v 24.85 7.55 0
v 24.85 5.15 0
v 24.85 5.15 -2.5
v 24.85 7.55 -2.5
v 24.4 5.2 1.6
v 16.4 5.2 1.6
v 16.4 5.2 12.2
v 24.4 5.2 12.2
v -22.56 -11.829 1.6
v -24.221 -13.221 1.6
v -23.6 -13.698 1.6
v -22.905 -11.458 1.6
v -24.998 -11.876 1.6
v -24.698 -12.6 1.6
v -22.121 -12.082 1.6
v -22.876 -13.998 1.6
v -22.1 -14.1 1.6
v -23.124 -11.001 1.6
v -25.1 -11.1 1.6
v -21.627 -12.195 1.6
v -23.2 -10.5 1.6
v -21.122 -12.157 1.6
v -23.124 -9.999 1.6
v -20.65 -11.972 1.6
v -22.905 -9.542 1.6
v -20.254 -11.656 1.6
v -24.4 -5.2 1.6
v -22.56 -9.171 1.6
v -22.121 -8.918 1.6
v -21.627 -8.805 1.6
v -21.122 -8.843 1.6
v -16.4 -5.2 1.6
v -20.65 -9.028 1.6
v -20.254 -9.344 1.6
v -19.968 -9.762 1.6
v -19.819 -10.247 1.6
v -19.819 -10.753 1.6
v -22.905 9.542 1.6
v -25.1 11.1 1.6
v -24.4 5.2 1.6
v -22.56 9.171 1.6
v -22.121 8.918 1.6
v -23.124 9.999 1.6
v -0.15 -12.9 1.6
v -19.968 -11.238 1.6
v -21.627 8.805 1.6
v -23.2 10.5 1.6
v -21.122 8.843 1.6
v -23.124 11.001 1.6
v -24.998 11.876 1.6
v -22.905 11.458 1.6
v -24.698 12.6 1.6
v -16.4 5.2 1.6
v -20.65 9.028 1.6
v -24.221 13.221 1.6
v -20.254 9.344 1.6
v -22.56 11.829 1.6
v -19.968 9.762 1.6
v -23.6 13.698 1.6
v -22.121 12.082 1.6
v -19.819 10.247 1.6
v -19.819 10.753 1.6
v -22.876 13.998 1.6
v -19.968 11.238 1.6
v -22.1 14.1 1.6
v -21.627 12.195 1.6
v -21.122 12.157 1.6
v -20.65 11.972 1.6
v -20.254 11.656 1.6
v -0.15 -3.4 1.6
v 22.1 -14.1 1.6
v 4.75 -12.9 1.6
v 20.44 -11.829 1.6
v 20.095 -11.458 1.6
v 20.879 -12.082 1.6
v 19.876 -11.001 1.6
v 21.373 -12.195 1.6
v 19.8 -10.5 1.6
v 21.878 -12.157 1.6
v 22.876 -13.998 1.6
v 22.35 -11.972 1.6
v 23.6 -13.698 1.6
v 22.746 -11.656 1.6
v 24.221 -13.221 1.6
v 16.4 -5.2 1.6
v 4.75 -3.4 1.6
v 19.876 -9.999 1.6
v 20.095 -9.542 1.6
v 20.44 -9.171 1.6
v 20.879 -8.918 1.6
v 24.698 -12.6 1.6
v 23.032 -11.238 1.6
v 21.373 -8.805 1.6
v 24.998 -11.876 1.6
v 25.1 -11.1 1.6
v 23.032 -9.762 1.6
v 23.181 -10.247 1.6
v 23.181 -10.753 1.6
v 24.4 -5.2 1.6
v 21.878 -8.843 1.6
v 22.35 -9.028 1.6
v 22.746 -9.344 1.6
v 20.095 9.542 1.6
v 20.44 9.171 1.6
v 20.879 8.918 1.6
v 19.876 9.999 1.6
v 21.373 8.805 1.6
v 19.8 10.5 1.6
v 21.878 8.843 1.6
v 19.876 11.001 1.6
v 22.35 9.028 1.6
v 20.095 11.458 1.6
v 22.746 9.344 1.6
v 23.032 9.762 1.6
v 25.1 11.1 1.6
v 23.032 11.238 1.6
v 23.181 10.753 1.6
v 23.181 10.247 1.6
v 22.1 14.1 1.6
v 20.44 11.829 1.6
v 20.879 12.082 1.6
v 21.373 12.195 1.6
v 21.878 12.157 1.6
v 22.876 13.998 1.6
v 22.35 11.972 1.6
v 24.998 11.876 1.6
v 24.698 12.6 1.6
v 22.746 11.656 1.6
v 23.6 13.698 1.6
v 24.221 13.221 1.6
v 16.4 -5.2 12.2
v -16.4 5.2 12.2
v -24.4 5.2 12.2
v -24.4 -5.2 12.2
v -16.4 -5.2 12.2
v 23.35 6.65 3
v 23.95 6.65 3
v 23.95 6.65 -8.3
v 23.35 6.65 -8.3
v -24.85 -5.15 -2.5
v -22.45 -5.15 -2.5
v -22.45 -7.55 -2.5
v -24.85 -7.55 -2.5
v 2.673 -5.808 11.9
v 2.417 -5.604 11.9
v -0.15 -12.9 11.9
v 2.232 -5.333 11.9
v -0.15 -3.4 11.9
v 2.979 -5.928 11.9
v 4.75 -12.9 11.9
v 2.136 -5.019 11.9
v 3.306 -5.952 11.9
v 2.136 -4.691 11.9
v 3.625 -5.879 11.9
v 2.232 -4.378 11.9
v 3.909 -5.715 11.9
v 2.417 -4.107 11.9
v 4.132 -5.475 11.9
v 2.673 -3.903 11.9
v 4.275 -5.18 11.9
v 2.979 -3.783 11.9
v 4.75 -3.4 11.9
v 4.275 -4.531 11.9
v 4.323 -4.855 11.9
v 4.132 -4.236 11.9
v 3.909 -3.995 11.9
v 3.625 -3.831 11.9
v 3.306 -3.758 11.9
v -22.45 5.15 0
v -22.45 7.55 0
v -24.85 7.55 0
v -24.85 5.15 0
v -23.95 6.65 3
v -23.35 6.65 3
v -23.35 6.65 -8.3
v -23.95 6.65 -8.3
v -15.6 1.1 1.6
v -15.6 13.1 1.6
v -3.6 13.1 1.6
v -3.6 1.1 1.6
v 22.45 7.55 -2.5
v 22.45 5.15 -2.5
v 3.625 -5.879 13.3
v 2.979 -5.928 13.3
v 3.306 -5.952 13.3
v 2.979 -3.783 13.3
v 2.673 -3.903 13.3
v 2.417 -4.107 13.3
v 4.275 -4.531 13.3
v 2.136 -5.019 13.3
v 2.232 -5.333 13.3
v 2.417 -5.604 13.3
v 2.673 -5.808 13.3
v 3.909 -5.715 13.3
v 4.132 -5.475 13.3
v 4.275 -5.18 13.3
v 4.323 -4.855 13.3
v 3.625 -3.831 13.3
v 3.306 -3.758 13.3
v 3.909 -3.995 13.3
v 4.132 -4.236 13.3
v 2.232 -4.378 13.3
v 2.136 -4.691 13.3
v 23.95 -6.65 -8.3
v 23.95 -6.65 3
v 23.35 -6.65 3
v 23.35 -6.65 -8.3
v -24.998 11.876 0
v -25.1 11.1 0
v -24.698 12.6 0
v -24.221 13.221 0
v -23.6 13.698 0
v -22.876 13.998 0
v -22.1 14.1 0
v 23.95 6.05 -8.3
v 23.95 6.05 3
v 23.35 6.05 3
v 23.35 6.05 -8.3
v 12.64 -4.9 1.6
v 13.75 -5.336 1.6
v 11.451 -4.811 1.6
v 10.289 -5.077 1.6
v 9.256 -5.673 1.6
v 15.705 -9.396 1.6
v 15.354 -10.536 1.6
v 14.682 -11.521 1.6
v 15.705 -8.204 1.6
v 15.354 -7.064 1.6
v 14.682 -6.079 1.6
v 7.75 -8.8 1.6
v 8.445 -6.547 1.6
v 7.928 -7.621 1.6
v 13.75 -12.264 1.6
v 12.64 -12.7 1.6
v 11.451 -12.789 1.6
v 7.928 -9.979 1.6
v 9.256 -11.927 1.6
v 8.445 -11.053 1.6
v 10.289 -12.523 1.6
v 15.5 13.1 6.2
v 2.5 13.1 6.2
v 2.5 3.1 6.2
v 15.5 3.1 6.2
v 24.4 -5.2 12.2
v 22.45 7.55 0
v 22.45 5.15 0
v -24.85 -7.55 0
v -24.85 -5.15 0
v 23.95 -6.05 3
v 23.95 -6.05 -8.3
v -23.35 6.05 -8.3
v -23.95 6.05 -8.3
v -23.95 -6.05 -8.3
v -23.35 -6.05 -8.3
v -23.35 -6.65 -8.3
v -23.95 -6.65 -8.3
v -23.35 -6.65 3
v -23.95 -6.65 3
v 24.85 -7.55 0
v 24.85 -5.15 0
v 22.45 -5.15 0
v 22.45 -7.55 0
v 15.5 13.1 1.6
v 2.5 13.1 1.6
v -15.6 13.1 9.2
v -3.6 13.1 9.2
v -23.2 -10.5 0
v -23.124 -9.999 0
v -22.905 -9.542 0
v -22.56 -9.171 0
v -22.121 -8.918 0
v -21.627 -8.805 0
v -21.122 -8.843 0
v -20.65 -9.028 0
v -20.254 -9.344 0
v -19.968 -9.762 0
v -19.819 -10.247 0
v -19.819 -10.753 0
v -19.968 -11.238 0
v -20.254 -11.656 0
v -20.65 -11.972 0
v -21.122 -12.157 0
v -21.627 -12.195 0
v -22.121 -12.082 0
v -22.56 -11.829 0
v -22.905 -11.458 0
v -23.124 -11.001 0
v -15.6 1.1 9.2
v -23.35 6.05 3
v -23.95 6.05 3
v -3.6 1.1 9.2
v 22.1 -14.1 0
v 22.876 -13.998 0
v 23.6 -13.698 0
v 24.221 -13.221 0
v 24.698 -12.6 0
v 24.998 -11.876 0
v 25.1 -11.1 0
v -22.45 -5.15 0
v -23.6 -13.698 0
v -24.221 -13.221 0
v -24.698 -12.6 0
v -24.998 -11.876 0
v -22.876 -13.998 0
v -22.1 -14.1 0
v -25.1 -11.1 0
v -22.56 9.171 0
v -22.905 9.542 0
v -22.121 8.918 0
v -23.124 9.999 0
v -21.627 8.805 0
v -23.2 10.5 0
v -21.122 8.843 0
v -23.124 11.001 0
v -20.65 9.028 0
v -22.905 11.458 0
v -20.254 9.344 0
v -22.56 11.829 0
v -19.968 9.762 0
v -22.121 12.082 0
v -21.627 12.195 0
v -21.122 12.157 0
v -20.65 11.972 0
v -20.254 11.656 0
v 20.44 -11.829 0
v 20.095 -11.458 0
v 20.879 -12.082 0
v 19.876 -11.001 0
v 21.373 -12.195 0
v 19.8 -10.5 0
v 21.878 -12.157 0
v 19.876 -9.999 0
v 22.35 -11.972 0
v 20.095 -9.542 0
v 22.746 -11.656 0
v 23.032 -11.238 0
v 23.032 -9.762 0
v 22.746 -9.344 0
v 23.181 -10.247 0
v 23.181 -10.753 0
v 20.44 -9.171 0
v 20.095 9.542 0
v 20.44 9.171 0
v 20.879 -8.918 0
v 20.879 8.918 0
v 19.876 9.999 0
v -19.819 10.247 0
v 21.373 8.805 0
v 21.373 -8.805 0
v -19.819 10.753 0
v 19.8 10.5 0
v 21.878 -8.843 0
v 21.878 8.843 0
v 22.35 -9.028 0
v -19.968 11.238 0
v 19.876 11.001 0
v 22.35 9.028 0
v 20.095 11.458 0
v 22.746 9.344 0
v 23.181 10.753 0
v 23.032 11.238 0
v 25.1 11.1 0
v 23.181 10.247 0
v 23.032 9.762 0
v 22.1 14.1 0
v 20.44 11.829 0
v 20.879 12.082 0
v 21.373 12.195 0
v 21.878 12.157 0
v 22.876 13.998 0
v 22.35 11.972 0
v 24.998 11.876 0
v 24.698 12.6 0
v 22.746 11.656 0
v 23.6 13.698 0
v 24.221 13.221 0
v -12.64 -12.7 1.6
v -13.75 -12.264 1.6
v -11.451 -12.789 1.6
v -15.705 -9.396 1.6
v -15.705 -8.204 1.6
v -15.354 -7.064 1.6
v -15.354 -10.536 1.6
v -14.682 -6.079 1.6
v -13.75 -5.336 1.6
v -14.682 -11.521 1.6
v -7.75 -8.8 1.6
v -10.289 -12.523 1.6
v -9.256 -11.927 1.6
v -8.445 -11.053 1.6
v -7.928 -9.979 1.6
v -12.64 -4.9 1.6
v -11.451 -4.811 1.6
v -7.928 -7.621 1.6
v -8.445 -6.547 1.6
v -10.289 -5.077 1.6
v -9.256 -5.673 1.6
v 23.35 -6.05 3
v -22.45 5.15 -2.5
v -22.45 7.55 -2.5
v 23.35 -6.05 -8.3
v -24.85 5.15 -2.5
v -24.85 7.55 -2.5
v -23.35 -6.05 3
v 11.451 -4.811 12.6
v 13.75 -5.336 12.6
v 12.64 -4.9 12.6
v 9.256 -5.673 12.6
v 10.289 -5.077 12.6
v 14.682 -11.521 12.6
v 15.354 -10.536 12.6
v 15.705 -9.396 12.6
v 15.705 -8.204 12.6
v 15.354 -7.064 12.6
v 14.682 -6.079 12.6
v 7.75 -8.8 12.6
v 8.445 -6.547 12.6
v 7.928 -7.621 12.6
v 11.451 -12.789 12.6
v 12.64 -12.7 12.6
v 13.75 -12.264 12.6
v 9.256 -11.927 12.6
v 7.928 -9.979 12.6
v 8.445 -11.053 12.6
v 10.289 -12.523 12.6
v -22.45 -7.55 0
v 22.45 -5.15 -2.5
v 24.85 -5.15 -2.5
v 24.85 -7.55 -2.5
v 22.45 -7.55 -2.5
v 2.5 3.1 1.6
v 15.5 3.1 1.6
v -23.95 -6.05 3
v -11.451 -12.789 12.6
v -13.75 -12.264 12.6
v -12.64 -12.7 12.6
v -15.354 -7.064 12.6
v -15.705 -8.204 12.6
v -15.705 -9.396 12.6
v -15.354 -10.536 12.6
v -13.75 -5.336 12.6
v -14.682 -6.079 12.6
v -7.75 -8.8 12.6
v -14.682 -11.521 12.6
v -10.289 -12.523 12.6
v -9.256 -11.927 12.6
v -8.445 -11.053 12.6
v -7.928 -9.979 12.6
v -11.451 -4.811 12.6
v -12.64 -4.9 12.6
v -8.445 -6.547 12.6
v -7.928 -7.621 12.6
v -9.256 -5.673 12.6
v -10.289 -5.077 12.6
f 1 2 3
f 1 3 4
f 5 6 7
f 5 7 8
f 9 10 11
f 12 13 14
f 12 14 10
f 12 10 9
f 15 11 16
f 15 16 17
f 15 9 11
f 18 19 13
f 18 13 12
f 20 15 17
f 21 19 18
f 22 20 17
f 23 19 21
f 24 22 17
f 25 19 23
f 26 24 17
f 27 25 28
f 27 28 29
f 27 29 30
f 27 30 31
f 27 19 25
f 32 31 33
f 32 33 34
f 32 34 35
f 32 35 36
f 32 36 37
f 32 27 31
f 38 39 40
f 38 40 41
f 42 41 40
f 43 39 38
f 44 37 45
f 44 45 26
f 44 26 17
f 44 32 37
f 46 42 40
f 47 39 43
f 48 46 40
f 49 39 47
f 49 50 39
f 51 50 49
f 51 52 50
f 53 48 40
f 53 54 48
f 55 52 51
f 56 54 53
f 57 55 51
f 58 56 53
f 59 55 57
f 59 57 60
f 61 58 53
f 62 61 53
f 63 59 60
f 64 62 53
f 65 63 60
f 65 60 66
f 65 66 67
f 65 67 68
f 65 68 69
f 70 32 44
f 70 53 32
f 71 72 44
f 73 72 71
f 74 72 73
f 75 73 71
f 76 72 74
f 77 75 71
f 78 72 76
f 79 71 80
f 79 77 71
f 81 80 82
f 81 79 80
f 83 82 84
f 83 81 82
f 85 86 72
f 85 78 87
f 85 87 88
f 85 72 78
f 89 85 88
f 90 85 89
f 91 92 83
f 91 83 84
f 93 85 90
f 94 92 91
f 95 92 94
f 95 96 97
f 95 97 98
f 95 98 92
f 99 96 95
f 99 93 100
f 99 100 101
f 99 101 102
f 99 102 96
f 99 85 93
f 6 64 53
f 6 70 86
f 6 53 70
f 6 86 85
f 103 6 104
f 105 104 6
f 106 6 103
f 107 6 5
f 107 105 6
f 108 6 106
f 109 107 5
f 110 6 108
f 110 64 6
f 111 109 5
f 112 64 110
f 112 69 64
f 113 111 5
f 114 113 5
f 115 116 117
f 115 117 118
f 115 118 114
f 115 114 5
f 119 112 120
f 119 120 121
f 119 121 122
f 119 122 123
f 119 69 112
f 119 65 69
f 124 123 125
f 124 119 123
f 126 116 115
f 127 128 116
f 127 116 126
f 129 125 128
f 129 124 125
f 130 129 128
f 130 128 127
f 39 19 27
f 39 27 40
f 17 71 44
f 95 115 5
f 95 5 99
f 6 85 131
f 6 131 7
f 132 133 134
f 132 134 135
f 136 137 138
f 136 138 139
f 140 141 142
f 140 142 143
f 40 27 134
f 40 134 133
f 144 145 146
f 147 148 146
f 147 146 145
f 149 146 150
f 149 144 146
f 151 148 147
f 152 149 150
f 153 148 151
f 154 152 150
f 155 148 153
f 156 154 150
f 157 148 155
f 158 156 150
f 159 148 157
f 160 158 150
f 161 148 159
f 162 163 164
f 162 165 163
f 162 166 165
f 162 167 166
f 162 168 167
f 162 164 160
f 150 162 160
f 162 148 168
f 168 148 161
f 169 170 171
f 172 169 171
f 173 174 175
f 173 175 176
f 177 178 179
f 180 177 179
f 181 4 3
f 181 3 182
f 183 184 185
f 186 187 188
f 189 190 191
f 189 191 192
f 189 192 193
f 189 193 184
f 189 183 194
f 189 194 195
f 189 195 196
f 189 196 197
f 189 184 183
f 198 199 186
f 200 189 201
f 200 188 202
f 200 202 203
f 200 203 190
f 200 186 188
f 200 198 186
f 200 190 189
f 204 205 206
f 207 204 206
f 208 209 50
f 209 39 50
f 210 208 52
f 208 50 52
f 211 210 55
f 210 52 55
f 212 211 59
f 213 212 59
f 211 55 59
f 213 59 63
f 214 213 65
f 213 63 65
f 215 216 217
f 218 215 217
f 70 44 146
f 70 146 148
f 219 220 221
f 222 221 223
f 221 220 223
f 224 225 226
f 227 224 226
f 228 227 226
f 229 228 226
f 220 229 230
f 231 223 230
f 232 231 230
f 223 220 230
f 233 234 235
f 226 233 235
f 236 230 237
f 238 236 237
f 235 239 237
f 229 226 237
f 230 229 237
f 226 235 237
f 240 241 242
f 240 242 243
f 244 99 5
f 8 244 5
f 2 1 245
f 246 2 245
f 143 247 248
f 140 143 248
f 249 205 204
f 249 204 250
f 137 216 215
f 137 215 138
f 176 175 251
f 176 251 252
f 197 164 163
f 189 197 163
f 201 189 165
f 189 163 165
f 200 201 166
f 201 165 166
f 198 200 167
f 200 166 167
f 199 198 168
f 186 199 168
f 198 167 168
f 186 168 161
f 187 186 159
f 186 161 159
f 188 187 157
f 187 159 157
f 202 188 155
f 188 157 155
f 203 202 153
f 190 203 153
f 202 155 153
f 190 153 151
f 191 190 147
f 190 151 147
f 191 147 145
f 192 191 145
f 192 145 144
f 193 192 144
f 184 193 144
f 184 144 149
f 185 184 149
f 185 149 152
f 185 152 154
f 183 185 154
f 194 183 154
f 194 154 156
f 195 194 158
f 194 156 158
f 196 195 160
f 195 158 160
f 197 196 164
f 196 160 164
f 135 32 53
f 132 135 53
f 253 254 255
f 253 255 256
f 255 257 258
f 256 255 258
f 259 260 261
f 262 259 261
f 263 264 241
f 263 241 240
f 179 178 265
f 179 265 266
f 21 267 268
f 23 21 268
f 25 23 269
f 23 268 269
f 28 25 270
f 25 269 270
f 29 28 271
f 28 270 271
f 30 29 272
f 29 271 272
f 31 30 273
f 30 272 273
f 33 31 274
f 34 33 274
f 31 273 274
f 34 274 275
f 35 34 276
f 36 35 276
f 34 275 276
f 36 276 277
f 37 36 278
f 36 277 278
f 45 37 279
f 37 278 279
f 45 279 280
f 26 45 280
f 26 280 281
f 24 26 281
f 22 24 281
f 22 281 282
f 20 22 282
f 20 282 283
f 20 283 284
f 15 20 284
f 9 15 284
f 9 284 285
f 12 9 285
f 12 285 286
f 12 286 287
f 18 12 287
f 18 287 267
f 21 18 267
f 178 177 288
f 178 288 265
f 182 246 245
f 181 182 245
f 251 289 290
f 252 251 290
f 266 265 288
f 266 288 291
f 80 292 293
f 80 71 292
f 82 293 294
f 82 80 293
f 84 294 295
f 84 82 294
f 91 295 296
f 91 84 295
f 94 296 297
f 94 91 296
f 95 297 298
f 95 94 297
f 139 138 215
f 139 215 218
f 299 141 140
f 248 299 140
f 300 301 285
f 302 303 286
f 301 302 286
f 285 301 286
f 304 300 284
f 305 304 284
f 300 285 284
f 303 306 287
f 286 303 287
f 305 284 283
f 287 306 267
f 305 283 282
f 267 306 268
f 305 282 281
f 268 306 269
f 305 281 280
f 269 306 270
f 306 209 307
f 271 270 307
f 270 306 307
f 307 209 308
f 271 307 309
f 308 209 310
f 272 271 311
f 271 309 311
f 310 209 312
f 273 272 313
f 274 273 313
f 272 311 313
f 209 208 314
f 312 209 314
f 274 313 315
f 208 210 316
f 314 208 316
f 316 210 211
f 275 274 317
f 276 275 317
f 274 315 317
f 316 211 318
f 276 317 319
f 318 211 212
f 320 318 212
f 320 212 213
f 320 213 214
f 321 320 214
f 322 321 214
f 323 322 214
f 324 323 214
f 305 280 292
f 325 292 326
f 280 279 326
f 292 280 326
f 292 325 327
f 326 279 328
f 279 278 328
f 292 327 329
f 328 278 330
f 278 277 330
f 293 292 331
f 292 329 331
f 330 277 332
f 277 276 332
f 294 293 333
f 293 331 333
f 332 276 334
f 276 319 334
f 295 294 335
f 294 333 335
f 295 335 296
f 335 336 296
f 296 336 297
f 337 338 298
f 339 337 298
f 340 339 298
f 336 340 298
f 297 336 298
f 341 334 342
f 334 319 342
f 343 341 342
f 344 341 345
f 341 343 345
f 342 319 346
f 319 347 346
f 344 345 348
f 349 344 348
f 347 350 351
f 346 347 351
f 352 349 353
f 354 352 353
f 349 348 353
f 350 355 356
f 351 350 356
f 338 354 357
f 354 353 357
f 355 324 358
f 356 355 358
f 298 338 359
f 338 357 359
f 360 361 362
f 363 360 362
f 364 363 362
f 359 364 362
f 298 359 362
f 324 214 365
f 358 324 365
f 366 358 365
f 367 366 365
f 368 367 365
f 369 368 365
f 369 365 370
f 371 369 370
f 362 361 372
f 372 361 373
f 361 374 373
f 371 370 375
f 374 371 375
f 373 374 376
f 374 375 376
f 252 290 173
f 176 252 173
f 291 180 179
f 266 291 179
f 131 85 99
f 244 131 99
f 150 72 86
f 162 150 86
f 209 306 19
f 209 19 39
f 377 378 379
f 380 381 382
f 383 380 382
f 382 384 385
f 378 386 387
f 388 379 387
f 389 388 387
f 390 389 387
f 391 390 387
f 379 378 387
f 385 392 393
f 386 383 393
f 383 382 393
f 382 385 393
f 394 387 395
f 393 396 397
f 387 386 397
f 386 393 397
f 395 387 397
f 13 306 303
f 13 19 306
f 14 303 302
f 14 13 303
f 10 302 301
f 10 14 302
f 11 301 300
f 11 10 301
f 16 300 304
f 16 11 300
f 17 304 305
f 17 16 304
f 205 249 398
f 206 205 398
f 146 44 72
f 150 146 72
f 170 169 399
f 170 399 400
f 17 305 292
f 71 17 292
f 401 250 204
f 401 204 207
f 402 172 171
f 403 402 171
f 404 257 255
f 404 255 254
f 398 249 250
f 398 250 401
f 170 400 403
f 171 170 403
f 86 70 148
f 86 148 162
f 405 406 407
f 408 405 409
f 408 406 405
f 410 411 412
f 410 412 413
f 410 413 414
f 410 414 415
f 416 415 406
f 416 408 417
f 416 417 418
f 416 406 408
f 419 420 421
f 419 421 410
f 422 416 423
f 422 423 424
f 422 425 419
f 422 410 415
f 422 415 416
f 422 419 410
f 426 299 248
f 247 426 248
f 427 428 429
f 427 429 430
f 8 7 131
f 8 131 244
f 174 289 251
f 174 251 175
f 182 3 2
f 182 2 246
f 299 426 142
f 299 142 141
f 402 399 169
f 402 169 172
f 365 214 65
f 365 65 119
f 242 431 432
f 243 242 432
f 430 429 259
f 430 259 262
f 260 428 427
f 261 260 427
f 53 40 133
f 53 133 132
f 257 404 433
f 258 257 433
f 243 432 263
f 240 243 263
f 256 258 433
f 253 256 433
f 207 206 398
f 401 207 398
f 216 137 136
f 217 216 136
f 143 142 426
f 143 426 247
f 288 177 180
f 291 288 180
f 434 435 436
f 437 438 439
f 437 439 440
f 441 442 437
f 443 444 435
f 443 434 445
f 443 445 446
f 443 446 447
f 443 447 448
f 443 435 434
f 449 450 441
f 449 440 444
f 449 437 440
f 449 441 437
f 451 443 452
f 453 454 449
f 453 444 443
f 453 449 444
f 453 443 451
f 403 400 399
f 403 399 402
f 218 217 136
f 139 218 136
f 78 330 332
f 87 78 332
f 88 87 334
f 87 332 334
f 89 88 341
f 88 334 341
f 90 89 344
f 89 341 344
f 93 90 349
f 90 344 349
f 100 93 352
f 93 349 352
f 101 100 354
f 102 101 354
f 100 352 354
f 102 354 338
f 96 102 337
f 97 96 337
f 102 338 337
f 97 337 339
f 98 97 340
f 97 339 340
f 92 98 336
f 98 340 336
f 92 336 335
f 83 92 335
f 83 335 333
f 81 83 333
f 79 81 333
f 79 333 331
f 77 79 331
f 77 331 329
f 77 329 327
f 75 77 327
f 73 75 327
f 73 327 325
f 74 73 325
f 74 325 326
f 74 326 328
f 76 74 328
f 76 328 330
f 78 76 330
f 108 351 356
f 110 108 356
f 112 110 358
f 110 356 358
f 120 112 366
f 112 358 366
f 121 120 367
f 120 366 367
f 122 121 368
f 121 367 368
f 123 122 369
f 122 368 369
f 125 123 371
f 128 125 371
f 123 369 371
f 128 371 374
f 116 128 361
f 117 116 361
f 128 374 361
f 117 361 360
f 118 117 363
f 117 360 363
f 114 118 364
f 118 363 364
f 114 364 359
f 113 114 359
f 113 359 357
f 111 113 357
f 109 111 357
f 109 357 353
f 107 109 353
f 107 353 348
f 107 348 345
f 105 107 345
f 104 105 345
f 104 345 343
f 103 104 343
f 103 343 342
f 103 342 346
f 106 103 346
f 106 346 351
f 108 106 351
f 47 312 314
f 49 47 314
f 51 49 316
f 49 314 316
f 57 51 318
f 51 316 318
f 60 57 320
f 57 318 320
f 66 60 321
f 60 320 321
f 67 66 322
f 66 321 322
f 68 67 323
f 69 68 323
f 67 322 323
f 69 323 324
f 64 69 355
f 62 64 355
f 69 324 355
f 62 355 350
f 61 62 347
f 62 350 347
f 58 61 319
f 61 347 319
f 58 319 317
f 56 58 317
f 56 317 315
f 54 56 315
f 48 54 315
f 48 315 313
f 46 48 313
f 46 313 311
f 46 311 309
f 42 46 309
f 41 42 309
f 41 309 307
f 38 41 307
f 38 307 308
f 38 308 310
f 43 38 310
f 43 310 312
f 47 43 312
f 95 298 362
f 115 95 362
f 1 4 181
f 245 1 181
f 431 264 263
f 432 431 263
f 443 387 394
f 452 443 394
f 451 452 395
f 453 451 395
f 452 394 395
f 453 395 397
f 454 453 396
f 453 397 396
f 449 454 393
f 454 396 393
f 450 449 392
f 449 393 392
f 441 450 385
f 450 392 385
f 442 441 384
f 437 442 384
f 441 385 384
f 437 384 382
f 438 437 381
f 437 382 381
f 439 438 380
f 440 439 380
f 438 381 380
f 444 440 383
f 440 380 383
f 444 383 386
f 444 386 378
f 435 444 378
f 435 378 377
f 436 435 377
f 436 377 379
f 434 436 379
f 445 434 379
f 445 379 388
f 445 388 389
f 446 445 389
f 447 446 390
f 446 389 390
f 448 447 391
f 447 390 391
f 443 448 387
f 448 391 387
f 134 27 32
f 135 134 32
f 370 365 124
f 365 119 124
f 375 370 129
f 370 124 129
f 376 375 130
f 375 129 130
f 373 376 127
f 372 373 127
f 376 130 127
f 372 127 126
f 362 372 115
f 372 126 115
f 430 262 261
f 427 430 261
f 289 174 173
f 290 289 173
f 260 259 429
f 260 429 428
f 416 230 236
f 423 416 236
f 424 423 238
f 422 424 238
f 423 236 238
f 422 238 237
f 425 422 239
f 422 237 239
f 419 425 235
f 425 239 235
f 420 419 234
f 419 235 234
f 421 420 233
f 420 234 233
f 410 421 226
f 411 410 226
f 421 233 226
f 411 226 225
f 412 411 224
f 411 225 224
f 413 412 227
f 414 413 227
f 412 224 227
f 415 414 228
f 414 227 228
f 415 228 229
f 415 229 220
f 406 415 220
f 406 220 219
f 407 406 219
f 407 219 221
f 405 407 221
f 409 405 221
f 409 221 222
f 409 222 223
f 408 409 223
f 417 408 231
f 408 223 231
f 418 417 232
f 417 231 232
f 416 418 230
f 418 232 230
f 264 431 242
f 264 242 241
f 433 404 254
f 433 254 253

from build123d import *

# Parameters (mm, degrees)
ESQUISSE1_W               = 50.2
ESQUISSE1_H               = 28.2
BOSS_EXTRU_1_DEPTH        = 1.6
D_GAGEMENT_M31_D          = 3.4
CONG_1_R                  = 3
ESQUISSE5_W               = 8
ESQUISSE5_H               = 10.4
BOSS_EXTRU_2_DEPTH        = 10.6
ESQUISSE6_R               = 4
BOSS_EXTRU_3_DEPTH        = 11
BOSS_EXTRU_3_2_DEPTH      = 11
ESQUISSE7_W               = 4.9
ESQUISSE7_H               = 9.5
BOSS_EXTRU_4_DEPTH        = 10.3
ESQUISSE8_R               = 1.1
BOSS_EXTRU_5_DEPTH        = 1.4
ESQUISSE9_W               = 12
ESQUISSE9_H               = 12
BOSS_EXTRU_6_DEPTH        = 7.6
ESQUISSE10_W              = 13
ESQUISSE10_H              = 10
BOSS_EXTRU_7_DEPTH        = 4.6
BOSS_EXTRU_8_DEPTH        = 8.3
BOSS_EXTRU_8_DEPTH_BACK   = 3
ESQUISSE11_W              = 0.6
ESQUISSE11_H              = 0.6
BOSS_EXTRU_8_2_DEPTH      = 8.3
BOSS_EXTRU_8_2_DEPTH_BACK = 3
BOSS_EXTRU_8_3_DEPTH      = 8.3
BOSS_EXTRU_8_3_DEPTH_BACK = 3
BOSS_EXTRU_8_4_DEPTH      = 8.3
BOSS_EXTRU_8_4_DEPTH_BACK = 3
ESQUISSE12_W              = 2.4
ESQUISSE12_H              = 2.4
BOSS_EXTRU_9_DEPTH        = 2.5
BOSS_EXTRU_9_2_DEPTH      = 2.5
BOSS_EXTRU_9_3_DEPTH      = 2.5
BOSS_EXTRU_9_4_DEPTH      = 2.5


with BuildPart() as part:
    # Esquisse1 → Boss.-Extru.1 (new body)
    with BuildSketch(Plane.XY):
        Rectangle(ESQUISSE1_W, ESQUISSE1_H)
    extrude(amount=BOSS_EXTRU_1_DEPTH)

    # Dégagement M31 (through all)
    with Locations(Plane.XY.offset(1.6)):
        with Locations((-21.5, 10.5), (21.5, 10.5), (21.5, -10.5), (-21.5, -10.5)):
            Hole(D_GAGEMENT_M31_D / 2)

    # Congé1
    cong_1_edges = [part.edges().sort_by_distance(p)[0] for p in [
        (-25.1, 14.1, 0.8),
        (25.1, 14.1, 0.8),
        (25.1, -14.1, 0.8),
        (-25.1, -14.1, 0.8),
    ]]
    fillet(cong_1_edges, radius=CONG_1_R)

    # Esquisse5 → Boss.-Extru.2 (add)
    with BuildSketch(Plane.XY.offset(1.6)):
        with Locations((-20.4, 0)):
            Rectangle(ESQUISSE5_W, ESQUISSE5_H)
        with Locations((20.4, 0)):
            Rectangle(ESQUISSE5_W, ESQUISSE5_H)
    extrude(amount=BOSS_EXTRU_2_DEPTH)



with BuildPart() as body_2:
    # Esquisse6 → Boss.-Extru.3 (new body)
    with BuildSketch(Plane.XY.offset(1.6)):
        with Locations((-11.75, -8.8)):
            Circle(ESQUISSE6_R)
    extrude(amount=BOSS_EXTRU_3_DEPTH)


with BuildPart() as body_3:
    # Esquisse6 → Boss.-Extru.3 2 (new body)
    with BuildSketch(Plane.XY.offset(1.6)):
        with Locations(Location((11.75, -8.8, 0), (0, 0, 180))):
            Circle(ESQUISSE6_R)
    extrude(amount=BOSS_EXTRU_3_2_DEPTH)


with BuildPart() as body_4:
    # Esquisse7 → Boss.-Extru.4 (new body)
    with BuildSketch(Plane.XY.offset(1.6)):
        with Locations((2.3, -8.15)):
            Rectangle(ESQUISSE7_W, ESQUISSE7_H)
    extrude(amount=BOSS_EXTRU_4_DEPTH)


with BuildPart() as part_1:
    add(part.part)

    add(body_4.part)  # Boss.-Extru.5 merges body 4
    # Esquisse8 → Boss.-Extru.5 (add)
    with BuildSketch(Plane.XY.offset(11.9)):
        with Locations((3.223425578, -4.855392367)):
            Circle(ESQUISSE8_R)
    extrude(amount=BOSS_EXTRU_5_DEPTH)


with BuildPart() as body_4_2:
    # Esquisse9 → Boss.-Extru.6 (new body)
    with BuildSketch(Plane.XY.offset(1.6)):
        with Locations((-9.6, 7.1)):
            Rectangle(ESQUISSE9_W, ESQUISSE9_H)
    extrude(amount=BOSS_EXTRU_6_DEPTH)


with BuildPart() as body_5:
    # Esquisse10 → Boss.-Extru.7 (new body)
    with BuildSketch(Plane.XY.offset(1.6)):
        with Locations((9, 8.1)):
            Rectangle(ESQUISSE10_W, ESQUISSE10_H)
    extrude(amount=BOSS_EXTRU_7_DEPTH)


with BuildPart() as body_6:
    # Esquisse11 → Boss.-Extru.8 (new, two sides: drawn at the far end of the back side and taken through both)
    with BuildSketch(Plane(origin=(0, 0, 0), x_dir=(-1, 0, 0), z_dir=(0, 0, -1)).offset(-BOSS_EXTRU_8_DEPTH_BACK)):
        with Locations((-23.65, 6.35)):
            Rectangle(ESQUISSE11_W, ESQUISSE11_H)
    extrude(amount=BOSS_EXTRU_8_DEPTH + BOSS_EXTRU_8_DEPTH_BACK)


with BuildPart() as body_7:
    # Esquisse11 → Boss.-Extru.8 2 (new, two sides: drawn at the far end of the back side and taken through both)
    with BuildSketch(Plane(origin=(0, 0, 0), x_dir=(-1, 0, 0), z_dir=(0, 0, -1)).offset(-BOSS_EXTRU_8_2_DEPTH_BACK)):
        with Locations((23.65, 6.35)):
            Rectangle(ESQUISSE11_W, ESQUISSE11_H)
    extrude(amount=BOSS_EXTRU_8_2_DEPTH + BOSS_EXTRU_8_2_DEPTH_BACK)


with BuildPart() as body_8:
    # Esquisse11 → Boss.-Extru.8 3 (new, two sides: drawn at the far end of the back side and taken through both)
    with BuildSketch(Plane(origin=(0, 0, 0), x_dir=(-1, 0, 0), z_dir=(0, 0, -1)).offset(-BOSS_EXTRU_8_3_DEPTH_BACK)):
        with Locations((-23.65, -6.35)):
            Rectangle(ESQUISSE11_W, ESQUISSE11_H)
    extrude(amount=BOSS_EXTRU_8_3_DEPTH + BOSS_EXTRU_8_3_DEPTH_BACK)


with BuildPart() as body_9:
    # Esquisse11 → Boss.-Extru.8 4 (new, two sides: drawn at the far end of the back side and taken through both)
    with BuildSketch(Plane(origin=(0, 0, 0), x_dir=(-1, 0, 0), z_dir=(0, 0, -1)).offset(-BOSS_EXTRU_8_4_DEPTH_BACK)):
        with Locations((23.65, -6.35)):
            Rectangle(ESQUISSE11_W, ESQUISSE11_H)
    extrude(amount=BOSS_EXTRU_8_4_DEPTH + BOSS_EXTRU_8_4_DEPTH_BACK)


with BuildPart() as body_10:
    # Esquisse12 → Boss.-Extru.9 (new body)
    with BuildSketch(Plane(origin=(0, 0, 0), x_dir=(-1, 0, 0), z_dir=(0, 0, -1))):
        with Locations((-23.65, 6.35)):
            Rectangle(ESQUISSE12_W, ESQUISSE12_H)
    extrude(amount=BOSS_EXTRU_9_DEPTH)


with BuildPart() as body_11:
    # Esquisse12 → Boss.-Extru.9 2 (new body)
    with BuildSketch(Plane(origin=(0, 0, 0), x_dir=(-1, 0, 0), z_dir=(0, 0, -1))):
        with Locations((23.65, 6.35)):
            Rectangle(ESQUISSE12_W, ESQUISSE12_H)
    extrude(amount=BOSS_EXTRU_9_2_DEPTH)


with BuildPart() as body_12:
    # Esquisse12 → Boss.-Extru.9 3 (new body)
    with BuildSketch(Plane(origin=(0, 0, 0), x_dir=(-1, 0, 0), z_dir=(0, 0, -1))):
        with Locations((23.65, -6.35)):
            Rectangle(ESQUISSE12_W, ESQUISSE12_H)
    extrude(amount=BOSS_EXTRU_9_3_DEPTH)


with BuildPart() as body_13:
    # Esquisse12 → Boss.-Extru.9 4 (new body)
    with BuildSketch(Plane(origin=(0, 0, 0), x_dir=(-1, 0, 0), z_dir=(0, 0, -1))):
        with Locations((-23.65, -6.35)):
            Rectangle(ESQUISSE12_W, ESQUISSE12_H)
    extrude(amount=BOSS_EXTRU_9_4_DEPTH)


solid = Compound([body_2.part, body_3.part, part_1.part, body_4_2.part, body_5.part, body_6.part, body_7.part, body_8.part, body_9.part, body_10.part, body_11.part, body_12.part, body_13.part])
